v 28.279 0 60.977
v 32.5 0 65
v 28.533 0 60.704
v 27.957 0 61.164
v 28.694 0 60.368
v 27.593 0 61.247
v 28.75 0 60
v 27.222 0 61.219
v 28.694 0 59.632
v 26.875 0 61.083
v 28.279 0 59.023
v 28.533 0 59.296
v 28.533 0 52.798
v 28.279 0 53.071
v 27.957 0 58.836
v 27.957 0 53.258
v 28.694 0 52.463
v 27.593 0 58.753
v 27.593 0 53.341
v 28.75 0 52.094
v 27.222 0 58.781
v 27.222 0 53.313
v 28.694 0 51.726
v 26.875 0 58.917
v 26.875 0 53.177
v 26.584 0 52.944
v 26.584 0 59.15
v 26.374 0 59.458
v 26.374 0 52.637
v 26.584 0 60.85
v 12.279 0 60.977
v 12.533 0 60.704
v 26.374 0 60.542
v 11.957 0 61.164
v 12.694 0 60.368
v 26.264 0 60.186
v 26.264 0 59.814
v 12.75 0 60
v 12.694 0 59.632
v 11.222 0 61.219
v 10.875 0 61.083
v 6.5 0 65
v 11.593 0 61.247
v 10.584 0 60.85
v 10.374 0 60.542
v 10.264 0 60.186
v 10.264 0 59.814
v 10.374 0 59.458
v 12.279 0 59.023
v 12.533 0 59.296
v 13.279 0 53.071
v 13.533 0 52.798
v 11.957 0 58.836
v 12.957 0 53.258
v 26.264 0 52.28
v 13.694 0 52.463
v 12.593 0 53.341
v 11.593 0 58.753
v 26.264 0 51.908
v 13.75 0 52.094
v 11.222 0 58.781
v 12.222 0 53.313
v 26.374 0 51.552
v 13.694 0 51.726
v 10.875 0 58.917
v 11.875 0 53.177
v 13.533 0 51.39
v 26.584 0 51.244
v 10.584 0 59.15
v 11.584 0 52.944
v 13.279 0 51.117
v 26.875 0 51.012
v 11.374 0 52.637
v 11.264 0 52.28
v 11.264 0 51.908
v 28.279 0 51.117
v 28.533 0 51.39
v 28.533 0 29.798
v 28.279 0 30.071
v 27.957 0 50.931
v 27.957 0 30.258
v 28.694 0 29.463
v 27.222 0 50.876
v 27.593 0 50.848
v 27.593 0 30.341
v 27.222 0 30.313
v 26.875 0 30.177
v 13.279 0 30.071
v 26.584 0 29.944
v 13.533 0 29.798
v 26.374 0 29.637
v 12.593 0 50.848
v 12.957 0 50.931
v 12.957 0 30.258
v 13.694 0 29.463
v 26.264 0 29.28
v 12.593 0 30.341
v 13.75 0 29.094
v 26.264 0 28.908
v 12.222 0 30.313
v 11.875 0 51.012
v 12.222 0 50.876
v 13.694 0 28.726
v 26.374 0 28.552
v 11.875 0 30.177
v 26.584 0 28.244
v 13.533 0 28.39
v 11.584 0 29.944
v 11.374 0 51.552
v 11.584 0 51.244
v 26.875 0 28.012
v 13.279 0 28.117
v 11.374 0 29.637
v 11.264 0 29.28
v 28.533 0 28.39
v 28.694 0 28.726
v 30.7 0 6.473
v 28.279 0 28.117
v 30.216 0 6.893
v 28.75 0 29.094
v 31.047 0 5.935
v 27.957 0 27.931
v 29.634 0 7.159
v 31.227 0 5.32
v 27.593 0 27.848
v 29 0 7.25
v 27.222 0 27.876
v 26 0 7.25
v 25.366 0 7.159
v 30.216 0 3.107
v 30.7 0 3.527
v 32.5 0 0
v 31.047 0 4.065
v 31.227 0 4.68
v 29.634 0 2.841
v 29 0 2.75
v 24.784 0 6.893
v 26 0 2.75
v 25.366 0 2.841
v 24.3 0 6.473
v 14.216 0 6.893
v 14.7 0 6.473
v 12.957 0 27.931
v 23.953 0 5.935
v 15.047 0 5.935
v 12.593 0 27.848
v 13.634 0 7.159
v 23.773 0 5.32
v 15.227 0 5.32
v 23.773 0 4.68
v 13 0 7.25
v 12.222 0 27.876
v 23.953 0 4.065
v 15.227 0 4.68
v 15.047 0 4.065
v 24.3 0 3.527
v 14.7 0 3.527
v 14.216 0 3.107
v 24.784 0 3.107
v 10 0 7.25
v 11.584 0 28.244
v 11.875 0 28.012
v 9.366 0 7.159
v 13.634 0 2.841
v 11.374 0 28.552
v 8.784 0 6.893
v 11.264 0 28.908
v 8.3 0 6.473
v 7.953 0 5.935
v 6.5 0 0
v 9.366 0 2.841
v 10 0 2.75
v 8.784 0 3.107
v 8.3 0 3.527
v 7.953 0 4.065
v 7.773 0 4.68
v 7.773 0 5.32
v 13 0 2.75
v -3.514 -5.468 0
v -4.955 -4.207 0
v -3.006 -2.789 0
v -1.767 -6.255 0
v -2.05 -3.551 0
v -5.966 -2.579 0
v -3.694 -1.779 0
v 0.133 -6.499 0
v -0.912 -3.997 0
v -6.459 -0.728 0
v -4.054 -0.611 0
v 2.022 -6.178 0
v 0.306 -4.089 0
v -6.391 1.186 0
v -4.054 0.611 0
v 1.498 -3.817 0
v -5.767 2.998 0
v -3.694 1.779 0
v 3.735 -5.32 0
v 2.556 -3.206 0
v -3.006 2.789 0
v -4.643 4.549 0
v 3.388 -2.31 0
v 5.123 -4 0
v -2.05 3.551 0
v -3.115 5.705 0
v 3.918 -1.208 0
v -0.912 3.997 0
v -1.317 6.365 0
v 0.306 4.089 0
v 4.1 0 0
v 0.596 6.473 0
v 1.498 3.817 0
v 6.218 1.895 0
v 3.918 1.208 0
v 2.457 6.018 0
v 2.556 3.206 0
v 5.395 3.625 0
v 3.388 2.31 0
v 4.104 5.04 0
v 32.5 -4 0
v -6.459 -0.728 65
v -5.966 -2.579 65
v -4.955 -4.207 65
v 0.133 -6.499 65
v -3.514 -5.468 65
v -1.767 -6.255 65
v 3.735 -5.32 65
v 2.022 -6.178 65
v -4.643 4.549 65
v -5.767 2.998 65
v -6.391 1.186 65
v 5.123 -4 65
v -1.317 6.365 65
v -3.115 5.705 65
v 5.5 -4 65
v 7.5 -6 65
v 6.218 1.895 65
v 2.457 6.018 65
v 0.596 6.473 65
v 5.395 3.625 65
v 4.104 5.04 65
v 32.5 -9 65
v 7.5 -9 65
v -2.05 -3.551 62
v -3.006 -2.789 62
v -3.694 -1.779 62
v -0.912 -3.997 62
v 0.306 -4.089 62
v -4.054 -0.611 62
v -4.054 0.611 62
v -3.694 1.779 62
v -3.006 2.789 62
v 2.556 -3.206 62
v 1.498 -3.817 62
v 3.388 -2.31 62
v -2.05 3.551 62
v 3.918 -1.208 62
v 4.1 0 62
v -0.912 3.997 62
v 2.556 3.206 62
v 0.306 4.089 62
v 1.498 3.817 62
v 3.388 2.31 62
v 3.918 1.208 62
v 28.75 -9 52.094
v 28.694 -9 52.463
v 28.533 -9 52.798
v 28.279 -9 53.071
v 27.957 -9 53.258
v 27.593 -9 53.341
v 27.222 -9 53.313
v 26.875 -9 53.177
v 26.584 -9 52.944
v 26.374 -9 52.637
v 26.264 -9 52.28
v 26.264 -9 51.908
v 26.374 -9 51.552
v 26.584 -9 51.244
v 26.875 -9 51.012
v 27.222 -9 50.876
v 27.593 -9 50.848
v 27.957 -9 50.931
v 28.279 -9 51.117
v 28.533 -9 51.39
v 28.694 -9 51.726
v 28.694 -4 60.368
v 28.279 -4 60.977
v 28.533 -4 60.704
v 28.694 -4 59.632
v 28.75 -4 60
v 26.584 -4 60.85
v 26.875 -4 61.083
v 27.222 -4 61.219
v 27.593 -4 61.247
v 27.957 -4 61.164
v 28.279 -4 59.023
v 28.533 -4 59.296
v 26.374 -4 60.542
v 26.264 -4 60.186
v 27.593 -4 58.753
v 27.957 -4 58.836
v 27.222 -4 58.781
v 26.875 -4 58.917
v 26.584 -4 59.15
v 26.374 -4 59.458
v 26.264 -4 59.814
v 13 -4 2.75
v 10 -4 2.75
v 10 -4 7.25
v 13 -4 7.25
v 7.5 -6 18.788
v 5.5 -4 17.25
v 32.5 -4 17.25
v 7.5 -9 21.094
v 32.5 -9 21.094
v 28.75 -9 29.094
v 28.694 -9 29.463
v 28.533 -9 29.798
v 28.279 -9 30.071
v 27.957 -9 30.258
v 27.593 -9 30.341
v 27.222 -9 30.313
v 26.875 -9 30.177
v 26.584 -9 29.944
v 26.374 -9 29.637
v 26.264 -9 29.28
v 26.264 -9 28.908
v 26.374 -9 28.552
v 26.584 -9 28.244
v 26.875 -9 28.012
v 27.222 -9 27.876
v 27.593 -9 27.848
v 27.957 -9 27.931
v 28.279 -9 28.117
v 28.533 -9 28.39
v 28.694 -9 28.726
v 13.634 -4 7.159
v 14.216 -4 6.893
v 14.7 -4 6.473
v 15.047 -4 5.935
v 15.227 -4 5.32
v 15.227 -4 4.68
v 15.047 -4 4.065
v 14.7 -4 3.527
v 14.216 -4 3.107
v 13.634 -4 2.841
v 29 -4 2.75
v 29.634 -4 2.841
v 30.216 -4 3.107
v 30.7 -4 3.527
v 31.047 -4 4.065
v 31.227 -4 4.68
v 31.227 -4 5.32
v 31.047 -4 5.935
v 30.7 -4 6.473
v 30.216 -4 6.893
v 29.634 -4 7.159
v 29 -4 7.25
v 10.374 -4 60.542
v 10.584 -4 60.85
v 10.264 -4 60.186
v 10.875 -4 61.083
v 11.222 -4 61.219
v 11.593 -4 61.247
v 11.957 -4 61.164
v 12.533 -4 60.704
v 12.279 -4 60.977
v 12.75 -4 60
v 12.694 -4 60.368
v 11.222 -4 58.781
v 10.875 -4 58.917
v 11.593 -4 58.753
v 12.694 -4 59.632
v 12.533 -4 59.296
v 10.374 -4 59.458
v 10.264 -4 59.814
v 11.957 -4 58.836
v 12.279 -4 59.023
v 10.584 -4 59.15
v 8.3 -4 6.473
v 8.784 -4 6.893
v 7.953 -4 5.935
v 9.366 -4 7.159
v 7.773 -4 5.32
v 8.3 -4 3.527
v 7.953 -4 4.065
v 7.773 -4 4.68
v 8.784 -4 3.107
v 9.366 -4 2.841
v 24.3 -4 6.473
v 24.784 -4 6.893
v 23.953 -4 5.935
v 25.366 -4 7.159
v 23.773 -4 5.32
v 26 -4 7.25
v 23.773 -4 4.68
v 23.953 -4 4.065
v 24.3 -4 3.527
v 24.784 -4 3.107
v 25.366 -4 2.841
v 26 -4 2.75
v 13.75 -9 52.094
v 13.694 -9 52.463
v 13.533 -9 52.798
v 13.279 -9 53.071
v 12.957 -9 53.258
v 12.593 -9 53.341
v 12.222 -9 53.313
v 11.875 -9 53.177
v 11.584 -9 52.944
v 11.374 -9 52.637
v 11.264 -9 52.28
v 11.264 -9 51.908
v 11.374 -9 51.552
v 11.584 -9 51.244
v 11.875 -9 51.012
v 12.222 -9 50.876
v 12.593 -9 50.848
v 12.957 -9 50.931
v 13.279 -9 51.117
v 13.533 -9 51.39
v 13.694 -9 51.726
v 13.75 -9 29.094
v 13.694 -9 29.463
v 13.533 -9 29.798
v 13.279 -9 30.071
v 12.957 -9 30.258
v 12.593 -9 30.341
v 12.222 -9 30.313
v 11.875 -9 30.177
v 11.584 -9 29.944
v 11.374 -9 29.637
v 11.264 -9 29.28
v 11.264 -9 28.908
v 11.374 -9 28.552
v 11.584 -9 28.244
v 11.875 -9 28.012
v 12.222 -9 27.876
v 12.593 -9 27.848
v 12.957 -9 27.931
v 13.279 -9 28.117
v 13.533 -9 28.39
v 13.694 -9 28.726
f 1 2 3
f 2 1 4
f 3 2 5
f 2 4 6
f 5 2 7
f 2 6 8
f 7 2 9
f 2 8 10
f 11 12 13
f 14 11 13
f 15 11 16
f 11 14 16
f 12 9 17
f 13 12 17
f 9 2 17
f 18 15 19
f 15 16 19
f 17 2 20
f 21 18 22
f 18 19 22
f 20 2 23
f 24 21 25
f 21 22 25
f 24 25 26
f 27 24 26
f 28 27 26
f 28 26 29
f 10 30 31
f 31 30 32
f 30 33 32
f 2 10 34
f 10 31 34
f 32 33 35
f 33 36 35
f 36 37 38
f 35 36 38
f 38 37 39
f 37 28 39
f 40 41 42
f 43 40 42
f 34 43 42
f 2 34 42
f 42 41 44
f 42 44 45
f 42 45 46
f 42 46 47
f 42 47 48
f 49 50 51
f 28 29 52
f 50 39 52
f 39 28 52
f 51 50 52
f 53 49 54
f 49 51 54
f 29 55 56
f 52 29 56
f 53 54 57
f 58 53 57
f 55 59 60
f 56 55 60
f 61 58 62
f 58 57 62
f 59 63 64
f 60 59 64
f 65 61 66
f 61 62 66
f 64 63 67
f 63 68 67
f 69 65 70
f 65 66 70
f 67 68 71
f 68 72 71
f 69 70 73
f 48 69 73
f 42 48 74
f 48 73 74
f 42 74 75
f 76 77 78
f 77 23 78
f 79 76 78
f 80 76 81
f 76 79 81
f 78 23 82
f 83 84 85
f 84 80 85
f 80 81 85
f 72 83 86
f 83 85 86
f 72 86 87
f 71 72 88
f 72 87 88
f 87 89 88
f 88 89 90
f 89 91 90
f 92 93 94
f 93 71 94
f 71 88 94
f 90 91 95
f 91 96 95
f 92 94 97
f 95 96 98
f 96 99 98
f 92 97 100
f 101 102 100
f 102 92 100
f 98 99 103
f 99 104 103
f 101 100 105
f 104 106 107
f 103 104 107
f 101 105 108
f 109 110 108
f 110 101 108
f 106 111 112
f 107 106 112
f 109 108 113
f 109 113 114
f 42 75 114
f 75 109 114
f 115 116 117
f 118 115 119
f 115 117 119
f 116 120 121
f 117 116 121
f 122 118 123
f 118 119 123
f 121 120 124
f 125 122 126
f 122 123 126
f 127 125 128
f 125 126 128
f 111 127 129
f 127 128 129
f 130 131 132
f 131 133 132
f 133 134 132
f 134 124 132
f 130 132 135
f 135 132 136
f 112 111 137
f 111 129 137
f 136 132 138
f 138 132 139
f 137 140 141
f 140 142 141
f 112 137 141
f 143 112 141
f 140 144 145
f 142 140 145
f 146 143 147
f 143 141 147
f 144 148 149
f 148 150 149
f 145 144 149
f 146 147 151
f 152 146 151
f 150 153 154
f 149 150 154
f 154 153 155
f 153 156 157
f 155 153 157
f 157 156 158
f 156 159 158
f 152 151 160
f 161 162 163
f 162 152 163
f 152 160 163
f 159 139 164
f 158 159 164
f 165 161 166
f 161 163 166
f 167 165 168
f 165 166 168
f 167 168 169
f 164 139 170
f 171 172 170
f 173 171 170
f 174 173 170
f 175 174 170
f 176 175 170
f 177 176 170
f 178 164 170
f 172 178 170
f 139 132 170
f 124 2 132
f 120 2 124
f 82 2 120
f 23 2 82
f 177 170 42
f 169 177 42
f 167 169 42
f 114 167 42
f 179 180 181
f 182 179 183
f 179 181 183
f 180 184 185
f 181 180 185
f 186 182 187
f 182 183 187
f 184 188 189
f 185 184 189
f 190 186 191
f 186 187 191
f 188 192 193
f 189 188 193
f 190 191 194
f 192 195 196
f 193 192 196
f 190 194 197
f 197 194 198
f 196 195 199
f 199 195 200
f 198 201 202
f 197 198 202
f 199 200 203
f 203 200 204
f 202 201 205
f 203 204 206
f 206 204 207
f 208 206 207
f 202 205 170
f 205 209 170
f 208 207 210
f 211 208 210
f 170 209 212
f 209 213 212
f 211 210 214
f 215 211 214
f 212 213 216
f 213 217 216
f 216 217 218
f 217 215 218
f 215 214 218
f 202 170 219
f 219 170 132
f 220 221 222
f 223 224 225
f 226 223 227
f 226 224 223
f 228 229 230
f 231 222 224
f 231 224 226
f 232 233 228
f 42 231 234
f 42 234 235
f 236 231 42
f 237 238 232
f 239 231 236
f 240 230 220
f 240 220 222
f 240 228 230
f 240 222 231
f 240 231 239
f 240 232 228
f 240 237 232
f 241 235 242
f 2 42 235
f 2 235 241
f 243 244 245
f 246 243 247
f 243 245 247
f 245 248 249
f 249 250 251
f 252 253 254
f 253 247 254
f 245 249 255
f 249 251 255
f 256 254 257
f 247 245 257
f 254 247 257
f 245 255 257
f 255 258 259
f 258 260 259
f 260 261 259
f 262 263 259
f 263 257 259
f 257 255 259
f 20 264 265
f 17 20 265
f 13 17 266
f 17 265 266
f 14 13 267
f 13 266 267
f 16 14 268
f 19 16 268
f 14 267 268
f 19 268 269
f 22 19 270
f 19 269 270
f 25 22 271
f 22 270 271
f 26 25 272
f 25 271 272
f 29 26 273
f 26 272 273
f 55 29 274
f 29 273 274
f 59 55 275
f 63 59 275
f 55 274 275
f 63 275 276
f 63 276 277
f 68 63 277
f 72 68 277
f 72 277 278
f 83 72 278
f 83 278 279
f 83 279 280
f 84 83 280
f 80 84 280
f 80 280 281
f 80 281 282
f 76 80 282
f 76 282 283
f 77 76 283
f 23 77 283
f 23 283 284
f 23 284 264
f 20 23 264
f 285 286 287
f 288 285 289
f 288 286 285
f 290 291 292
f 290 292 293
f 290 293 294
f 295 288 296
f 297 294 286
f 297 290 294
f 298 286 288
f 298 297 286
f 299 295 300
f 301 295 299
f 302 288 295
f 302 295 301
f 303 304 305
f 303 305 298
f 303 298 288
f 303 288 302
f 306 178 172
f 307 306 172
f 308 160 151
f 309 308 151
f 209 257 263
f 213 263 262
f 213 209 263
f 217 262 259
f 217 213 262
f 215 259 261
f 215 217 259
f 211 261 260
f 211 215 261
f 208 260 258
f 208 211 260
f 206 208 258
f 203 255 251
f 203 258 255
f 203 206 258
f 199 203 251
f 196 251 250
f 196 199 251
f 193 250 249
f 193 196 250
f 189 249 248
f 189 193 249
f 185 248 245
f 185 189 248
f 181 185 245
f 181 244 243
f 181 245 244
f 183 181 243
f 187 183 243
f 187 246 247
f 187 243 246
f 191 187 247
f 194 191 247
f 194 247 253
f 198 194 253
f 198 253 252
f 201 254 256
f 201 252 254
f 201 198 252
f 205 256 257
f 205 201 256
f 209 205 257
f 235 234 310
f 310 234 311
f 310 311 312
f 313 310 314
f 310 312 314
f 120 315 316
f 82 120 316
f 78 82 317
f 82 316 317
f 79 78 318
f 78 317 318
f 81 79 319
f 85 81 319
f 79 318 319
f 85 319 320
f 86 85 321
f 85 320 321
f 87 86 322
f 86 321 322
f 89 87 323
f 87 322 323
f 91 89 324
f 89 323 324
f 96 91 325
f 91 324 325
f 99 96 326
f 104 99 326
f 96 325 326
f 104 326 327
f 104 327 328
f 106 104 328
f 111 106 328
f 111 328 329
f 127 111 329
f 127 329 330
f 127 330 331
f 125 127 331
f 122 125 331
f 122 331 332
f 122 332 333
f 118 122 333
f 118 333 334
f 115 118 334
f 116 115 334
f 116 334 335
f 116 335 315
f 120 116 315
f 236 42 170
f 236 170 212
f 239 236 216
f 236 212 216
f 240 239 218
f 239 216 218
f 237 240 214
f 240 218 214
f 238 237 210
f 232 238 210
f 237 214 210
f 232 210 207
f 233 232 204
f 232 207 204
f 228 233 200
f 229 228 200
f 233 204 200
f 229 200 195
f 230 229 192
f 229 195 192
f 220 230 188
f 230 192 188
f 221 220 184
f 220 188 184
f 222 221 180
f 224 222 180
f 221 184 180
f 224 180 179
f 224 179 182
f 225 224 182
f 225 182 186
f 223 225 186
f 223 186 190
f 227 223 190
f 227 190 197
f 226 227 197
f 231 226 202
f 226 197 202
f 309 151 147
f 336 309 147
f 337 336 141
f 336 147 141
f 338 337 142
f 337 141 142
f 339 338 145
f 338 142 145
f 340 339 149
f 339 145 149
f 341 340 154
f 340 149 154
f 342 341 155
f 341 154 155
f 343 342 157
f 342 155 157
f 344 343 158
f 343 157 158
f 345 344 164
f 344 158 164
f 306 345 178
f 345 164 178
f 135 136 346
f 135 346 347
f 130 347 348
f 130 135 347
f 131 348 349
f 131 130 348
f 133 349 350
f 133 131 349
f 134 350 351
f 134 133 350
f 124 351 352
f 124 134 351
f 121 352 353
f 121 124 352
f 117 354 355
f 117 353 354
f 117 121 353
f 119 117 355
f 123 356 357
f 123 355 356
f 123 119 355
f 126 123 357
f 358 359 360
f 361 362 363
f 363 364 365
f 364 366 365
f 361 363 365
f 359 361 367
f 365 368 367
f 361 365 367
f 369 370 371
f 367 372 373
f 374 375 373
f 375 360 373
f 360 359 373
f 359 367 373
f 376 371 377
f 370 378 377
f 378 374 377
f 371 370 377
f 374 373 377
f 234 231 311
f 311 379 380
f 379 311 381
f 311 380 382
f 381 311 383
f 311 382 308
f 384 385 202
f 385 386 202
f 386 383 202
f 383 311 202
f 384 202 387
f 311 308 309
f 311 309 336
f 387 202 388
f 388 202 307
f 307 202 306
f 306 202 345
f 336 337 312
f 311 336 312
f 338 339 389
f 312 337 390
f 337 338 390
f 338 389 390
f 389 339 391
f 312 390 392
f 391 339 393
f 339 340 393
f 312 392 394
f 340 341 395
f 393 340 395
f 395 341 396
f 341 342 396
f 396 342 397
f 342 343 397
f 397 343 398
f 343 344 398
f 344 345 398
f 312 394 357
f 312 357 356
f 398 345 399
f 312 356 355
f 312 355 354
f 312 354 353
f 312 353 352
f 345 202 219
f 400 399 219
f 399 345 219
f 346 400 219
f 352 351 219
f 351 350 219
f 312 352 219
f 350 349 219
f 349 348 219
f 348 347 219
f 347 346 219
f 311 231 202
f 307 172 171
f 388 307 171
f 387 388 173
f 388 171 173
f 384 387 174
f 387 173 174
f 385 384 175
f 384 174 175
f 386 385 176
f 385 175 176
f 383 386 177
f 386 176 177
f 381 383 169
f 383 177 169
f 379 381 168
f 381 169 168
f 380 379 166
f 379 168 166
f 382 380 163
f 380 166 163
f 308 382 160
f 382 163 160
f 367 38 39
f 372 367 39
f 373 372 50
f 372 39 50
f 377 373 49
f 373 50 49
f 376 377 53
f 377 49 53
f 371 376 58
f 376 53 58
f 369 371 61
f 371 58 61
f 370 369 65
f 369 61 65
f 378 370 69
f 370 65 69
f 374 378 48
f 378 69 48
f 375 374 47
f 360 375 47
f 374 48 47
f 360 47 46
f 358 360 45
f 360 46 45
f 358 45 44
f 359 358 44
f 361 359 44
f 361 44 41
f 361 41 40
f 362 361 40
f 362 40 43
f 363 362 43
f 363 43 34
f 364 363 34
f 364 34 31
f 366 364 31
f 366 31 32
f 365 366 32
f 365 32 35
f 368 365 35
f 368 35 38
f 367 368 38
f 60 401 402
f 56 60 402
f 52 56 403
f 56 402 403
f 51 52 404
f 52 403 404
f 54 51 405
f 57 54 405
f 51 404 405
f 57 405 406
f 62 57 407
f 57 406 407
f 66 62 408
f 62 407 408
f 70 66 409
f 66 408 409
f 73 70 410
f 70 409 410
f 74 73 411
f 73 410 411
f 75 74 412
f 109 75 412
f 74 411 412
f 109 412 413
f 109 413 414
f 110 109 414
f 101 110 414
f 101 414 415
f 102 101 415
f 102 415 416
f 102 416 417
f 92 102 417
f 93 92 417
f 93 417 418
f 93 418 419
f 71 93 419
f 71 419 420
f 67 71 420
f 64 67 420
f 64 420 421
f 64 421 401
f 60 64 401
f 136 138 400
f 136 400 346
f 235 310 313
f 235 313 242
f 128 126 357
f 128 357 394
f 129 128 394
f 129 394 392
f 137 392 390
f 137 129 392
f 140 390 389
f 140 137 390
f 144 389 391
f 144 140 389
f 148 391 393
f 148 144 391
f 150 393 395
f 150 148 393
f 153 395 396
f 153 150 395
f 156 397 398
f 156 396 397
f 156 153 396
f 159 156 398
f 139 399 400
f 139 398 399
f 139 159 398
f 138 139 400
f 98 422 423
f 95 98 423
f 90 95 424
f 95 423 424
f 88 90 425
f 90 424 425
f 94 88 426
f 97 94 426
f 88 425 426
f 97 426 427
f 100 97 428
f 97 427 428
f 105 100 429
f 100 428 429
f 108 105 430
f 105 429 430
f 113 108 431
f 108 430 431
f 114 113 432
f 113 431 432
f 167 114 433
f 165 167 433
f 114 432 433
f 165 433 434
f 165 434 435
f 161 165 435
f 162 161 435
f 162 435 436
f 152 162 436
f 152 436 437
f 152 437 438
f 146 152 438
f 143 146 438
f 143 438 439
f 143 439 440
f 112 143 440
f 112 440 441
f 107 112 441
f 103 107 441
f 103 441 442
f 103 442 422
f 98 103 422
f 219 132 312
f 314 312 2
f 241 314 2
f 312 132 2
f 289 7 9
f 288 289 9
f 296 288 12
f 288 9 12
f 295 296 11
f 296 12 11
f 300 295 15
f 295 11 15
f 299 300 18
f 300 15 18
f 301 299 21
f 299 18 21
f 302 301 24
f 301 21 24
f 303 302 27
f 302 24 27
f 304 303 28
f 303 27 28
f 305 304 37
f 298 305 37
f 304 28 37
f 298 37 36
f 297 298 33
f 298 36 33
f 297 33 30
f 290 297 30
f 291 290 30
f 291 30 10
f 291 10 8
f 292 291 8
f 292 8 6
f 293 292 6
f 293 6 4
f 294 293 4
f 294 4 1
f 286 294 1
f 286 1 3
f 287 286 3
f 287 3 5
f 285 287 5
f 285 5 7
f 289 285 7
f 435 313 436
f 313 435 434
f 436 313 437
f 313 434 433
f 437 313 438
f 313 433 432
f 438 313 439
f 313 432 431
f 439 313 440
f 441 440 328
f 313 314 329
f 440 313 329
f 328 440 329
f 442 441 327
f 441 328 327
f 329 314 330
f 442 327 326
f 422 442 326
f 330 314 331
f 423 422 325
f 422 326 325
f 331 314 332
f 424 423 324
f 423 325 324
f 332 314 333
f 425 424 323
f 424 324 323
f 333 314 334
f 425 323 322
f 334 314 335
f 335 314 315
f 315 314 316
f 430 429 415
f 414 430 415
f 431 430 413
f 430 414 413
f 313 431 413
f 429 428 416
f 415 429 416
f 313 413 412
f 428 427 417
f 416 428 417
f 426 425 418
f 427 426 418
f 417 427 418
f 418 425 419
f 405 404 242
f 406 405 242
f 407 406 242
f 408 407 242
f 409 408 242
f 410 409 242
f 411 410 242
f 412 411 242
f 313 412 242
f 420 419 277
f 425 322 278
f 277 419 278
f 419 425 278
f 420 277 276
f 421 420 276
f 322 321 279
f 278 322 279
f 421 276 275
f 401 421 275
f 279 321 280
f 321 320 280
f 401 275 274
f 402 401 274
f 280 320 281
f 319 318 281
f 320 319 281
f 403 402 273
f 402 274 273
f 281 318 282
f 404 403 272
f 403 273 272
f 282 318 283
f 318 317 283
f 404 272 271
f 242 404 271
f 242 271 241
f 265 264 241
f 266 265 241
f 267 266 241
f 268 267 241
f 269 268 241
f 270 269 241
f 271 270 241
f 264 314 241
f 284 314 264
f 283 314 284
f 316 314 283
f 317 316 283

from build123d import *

# Parameters (mm, degrees)
SKETCH_1_R           = 4.1
EXTRUDE_1_DEPTH      = 65
SKETCH_2_R           = 4.923200542
EXTRUDE_2_DEPTH      = 3
SKETCH_3_R           = 1.25
CUT_EXTRUDE_1_DEPTH  = 13
EXTRUDE_3_DEPTH      = 12.5
EXTRUDE_3_DEPTH_BACK = 12.5
CHAMFER_4_SIZE       = 2
SKETCH_5_R           = 1.25
CUT_EXTRUDE_2_DEPTH  = 10


with BuildPart() as part:
    # Эскиз1 → Бобышка-Вытянуть1 (new body)
    with BuildSketch(Plane.XY):
        with BuildLine():
            Line((5.123475383, -4), (32.5, -4))
            Line((32.5, -4), (32.5, 0))
            Line((32.5, 0), (6.5, 0))
            ThreePointArc((6.5, 0), (-6.146242348, 2.115113473), (5.123475383, -4))
        make_face()
        Circle(SKETCH_1_R, mode=Mode.SUBTRACT)
    extrude(amount=EXTRUDE_1_DEPTH)

    # Эскиз2 → Бобышка-Вытянуть2 (add)
    with BuildSketch(Plane.XY.offset(65)):
        Circle(SKETCH_2_R)
    extrude(amount=-EXTRUDE_2_DEPTH)

    # Эскиз3 → Вырез-Вытянуть1 (cut)
    with BuildSketch(Plane(origin=(0, 0, 0), x_dir=(1, 0, 0), z_dir=(0, 1, 0))):
        with Locations((11.5, -60)):
            Circle(SKETCH_3_R)
        with Locations((27.5, -60)):
            Circle(SKETCH_3_R)
        with BuildLine():
            Line((10, -7.25), (13, -7.25))
            ThreePointArc((13, -7.25), (15.25, -5), (13, -2.75))
            Line((13, -2.75), (10, -2.75))
            ThreePointArc((10, -2.75), (7.75, -5), (10, -7.25))
        make_face()
        with BuildLine():
            Line((26, -2.75), (29, -2.75))
            ThreePointArc((29, -2.75), (31.25, -5), (29, -7.25))
            Line((29, -7.25), (26, -7.25))
            ThreePointArc((26, -7.25), (23.75, -5), (26, -2.75))
        make_face()
    extrude(amount=-CUT_EXTRUDE_1_DEPTH, mode=Mode.SUBTRACT)

    # Эскиз4 → Бобышка-Вытянуть3 (add, two sides: drawn at the far end of the back side and taken through both)
    with BuildSketch(Plane(origin=(20, 0, 0), x_dir=(0, 0, -1), z_dir=(1, 0, 0)).offset(-EXTRUDE_3_DEPTH_BACK)):
        Polygon((-17.25, -4), (-21.094184264, -9), (-65, -9), (-65, -4), align=None)
    extrude(amount=EXTRUDE_3_DEPTH + EXTRUDE_3_DEPTH_BACK)

    # Фаска4
    chamfer_4_edges = [part.edges().sort_by_distance(p)[0] for p in [
        (7.5, -4, 41.125),
    ]]
    chamfer(chamfer_4_edges, length=CHAMFER_4_SIZE)

    # Эскиз5 → Вырез-Вытянуть2 (cut)
    with BuildSketch(Plane.XZ.offset(9)):
        with Locations((27.5, 29.094184264)):
            Circle(SKETCH_5_R)
        with Locations((12.5, 29.094184264)):
            Circle(SKETCH_5_R)
        with Locations((27.5, 52.094184264)):
            Circle(SKETCH_5_R)
        with Locations((12.5, 52.094184264)):
            Circle(SKETCH_5_R)
    extrude(amount=-CUT_EXTRUDE_2_DEPTH, mode=Mode.SUBTRACT)


solid = part.part
